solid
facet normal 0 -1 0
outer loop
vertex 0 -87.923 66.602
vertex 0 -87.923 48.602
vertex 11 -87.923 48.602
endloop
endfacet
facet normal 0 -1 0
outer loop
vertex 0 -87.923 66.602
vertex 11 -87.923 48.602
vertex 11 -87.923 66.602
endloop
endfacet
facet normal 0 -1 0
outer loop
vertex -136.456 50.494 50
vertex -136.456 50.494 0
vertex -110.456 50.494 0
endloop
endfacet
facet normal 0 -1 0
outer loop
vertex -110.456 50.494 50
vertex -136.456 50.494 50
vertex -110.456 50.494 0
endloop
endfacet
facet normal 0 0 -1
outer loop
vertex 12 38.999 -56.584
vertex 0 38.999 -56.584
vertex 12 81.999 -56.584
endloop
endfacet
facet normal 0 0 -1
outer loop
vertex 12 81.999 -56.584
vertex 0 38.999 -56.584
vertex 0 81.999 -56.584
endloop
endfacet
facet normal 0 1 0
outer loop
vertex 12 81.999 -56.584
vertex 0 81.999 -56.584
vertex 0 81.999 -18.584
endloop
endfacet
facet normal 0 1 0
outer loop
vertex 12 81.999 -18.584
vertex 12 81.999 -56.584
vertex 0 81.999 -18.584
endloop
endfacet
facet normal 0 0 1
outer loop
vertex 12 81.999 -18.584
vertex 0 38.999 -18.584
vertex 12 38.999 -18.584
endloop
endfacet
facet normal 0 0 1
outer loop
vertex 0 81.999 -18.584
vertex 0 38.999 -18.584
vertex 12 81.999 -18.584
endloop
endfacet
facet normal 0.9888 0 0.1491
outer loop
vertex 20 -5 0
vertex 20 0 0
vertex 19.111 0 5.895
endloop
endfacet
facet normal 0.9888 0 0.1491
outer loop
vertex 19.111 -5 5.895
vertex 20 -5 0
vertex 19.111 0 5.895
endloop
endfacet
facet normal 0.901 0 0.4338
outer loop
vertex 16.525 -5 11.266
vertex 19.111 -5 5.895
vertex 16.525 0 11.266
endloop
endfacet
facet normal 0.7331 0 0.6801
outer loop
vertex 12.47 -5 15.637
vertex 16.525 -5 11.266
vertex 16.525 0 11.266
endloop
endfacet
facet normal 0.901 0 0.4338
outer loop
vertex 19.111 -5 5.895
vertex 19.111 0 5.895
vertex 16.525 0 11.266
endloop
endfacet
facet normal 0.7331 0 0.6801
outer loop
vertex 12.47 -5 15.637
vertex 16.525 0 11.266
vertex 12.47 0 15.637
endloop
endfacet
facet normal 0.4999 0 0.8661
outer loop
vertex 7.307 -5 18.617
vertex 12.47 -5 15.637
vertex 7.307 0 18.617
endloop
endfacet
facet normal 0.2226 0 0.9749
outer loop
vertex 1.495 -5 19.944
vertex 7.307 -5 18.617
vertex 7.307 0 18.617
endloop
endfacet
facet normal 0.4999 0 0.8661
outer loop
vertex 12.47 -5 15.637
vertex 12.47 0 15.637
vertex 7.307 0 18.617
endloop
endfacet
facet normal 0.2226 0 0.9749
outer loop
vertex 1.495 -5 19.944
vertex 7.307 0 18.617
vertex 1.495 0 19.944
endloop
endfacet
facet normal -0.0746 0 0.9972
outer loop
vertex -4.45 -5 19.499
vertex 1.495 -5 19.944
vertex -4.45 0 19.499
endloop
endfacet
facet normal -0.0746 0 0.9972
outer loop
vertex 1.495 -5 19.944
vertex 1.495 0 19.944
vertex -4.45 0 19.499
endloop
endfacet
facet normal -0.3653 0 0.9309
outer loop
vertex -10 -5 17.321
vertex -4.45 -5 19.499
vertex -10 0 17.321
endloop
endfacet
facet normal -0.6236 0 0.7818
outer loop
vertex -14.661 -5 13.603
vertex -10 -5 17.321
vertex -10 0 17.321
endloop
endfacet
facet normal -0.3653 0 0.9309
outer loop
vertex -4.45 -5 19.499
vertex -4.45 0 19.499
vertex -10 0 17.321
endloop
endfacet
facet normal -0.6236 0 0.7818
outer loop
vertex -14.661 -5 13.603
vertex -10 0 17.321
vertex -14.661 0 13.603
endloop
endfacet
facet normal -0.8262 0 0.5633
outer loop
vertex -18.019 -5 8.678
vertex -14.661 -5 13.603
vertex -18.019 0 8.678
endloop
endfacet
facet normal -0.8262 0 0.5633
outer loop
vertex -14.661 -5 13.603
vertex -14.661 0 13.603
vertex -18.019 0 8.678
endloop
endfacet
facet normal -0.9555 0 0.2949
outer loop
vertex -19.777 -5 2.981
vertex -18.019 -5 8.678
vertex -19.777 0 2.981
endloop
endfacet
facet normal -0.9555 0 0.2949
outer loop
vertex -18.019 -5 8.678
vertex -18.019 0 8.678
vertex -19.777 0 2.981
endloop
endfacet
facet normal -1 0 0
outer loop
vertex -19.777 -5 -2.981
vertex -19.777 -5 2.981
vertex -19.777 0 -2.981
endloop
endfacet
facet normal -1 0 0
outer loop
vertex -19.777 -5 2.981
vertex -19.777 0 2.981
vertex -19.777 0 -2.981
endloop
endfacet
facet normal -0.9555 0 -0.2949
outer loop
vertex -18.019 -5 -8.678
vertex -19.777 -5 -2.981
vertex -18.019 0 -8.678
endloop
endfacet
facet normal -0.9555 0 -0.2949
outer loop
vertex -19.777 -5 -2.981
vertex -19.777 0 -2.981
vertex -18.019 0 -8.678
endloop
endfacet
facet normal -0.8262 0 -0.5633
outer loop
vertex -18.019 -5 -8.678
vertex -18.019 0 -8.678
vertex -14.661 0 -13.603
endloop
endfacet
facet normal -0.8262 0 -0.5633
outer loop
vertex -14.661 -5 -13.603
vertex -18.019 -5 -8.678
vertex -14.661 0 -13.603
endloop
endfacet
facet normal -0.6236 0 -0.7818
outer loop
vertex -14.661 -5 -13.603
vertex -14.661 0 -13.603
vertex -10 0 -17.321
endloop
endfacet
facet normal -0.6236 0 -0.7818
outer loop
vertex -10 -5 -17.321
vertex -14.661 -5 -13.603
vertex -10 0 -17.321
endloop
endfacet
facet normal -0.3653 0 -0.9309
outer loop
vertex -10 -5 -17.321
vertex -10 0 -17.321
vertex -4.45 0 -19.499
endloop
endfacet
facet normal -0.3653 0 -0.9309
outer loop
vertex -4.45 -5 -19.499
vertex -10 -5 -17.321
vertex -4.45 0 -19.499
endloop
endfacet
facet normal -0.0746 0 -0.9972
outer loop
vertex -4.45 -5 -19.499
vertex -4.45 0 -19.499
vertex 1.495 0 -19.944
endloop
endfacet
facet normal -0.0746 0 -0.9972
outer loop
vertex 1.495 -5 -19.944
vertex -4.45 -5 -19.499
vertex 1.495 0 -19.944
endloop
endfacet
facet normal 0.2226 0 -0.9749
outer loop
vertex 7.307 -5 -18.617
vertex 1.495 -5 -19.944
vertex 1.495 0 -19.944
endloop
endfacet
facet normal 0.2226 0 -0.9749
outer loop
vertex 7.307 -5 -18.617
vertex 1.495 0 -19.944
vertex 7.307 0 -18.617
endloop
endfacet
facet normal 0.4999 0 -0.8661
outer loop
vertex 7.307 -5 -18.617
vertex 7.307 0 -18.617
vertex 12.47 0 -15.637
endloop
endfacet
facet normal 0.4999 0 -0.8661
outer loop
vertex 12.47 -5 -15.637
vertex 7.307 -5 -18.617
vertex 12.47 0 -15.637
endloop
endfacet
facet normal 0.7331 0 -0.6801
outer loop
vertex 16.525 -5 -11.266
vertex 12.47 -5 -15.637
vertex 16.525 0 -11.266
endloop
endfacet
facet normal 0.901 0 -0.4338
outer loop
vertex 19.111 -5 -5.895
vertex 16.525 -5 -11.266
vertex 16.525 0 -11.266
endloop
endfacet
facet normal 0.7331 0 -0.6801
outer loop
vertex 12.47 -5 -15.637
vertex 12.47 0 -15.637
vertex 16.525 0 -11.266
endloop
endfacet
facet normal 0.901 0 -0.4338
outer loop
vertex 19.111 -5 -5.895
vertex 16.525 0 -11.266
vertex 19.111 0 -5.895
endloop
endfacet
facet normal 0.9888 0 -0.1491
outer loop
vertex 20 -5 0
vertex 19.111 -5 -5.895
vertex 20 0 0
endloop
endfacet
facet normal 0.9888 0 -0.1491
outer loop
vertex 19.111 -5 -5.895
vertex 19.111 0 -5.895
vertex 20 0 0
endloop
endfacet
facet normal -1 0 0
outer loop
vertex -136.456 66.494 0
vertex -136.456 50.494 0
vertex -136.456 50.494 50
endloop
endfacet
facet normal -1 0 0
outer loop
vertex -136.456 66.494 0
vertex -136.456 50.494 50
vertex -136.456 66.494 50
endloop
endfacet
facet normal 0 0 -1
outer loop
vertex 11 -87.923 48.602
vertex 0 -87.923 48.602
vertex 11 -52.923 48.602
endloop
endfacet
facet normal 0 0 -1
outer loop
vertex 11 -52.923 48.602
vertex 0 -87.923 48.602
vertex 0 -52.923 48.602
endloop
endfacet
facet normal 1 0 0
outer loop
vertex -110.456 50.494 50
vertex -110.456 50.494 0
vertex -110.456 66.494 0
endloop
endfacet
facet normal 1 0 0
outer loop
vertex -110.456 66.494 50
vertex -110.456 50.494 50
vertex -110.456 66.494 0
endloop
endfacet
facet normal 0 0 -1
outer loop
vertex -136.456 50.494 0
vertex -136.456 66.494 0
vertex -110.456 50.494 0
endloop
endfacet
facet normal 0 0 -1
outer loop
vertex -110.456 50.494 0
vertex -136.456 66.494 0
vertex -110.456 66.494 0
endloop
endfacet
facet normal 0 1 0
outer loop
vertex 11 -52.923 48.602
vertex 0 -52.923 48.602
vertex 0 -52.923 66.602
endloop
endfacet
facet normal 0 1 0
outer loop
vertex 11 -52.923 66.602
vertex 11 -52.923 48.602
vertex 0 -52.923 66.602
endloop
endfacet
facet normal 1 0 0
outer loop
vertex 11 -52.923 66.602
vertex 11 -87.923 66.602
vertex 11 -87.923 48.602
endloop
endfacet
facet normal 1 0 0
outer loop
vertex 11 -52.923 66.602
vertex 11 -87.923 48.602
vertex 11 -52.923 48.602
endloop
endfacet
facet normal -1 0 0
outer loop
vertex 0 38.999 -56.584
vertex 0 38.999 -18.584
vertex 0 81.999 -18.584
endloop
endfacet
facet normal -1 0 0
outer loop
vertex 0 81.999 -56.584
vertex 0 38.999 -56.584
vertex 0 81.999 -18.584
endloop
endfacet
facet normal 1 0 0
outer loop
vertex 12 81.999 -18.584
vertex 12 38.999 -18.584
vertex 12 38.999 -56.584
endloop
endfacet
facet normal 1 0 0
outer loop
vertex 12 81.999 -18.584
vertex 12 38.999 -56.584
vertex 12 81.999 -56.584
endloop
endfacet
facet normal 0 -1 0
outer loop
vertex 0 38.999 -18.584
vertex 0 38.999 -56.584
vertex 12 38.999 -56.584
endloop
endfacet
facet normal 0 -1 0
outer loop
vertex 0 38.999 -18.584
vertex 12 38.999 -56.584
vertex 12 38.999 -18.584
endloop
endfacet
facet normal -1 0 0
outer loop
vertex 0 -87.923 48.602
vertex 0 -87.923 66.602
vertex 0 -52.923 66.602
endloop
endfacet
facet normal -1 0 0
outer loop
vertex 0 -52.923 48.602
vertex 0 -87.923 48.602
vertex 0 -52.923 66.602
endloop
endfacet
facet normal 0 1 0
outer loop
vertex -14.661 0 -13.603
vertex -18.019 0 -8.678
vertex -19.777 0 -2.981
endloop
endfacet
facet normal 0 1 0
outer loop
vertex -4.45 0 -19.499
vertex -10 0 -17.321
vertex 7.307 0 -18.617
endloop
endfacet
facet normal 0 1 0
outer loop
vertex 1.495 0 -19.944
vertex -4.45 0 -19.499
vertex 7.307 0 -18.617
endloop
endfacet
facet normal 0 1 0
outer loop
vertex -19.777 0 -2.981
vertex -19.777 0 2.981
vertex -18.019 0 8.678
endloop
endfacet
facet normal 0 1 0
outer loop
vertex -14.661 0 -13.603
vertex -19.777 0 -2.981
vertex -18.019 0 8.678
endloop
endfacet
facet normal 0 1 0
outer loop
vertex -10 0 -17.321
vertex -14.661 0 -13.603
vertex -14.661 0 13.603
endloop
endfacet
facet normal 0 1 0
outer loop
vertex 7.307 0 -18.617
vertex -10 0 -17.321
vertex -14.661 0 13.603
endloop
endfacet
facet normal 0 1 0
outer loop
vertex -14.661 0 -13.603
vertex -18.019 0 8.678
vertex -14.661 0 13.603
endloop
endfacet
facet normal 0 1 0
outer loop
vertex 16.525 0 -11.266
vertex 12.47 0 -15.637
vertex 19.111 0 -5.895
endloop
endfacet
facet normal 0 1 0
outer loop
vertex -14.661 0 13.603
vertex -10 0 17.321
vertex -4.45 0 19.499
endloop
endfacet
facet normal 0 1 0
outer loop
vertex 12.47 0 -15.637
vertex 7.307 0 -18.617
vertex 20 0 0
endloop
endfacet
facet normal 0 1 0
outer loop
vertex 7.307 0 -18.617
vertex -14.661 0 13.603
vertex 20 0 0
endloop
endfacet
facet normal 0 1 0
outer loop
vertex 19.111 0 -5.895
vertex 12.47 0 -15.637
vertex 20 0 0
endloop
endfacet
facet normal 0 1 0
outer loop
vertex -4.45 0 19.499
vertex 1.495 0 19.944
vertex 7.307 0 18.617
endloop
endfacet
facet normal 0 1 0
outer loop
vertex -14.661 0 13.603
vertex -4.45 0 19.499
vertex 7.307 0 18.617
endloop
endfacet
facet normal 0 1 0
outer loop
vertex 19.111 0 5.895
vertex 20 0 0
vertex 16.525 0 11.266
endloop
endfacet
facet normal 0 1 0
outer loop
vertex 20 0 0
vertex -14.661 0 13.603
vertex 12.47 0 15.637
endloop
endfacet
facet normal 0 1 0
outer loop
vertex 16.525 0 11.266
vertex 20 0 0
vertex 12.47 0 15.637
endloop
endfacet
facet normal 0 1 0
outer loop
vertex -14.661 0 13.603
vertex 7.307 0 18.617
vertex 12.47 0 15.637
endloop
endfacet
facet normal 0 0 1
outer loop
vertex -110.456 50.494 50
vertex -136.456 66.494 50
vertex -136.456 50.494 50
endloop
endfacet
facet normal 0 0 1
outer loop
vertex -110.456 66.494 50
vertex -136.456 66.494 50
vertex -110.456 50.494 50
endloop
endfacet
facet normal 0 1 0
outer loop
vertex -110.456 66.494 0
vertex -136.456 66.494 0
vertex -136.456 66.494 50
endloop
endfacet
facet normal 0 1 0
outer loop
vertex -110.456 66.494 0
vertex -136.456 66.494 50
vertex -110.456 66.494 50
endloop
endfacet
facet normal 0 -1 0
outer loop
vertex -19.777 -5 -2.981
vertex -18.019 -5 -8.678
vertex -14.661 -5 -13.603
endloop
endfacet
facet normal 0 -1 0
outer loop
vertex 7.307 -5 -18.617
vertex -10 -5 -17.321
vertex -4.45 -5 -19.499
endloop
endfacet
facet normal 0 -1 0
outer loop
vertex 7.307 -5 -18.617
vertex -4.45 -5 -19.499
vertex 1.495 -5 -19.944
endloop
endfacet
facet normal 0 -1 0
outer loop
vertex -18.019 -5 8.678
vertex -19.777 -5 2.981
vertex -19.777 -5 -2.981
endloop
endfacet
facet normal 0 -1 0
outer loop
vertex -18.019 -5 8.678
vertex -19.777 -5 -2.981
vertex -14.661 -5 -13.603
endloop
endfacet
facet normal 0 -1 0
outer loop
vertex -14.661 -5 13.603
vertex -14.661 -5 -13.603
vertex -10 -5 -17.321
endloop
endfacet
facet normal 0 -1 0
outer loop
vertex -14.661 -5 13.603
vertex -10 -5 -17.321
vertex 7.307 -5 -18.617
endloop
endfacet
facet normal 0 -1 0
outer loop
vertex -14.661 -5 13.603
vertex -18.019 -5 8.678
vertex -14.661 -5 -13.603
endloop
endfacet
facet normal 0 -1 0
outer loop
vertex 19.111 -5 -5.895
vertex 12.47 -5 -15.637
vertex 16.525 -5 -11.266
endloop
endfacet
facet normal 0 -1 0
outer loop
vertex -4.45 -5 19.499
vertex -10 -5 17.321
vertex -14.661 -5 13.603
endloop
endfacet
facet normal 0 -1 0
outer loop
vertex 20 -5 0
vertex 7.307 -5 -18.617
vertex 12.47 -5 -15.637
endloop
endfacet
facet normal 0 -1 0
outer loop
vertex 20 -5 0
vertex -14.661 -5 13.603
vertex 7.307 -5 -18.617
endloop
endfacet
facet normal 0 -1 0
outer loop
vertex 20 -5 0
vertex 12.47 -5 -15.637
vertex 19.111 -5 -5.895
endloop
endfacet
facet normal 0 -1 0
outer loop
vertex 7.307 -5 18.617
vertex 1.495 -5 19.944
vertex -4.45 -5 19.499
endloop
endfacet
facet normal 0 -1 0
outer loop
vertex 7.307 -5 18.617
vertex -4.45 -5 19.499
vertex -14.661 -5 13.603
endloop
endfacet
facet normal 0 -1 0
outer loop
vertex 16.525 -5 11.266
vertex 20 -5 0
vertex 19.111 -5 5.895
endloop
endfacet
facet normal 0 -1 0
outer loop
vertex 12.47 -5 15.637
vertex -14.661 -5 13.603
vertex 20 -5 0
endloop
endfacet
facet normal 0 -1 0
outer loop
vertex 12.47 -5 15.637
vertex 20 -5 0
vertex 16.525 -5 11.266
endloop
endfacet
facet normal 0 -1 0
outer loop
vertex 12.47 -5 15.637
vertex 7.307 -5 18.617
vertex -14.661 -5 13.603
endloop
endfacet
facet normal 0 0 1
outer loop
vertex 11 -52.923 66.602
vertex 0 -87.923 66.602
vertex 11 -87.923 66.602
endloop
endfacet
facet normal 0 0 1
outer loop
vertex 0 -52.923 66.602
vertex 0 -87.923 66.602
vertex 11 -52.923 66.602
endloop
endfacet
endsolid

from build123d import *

# Parameters (mm, degrees)
F0_W     = 26
F0_H     = 16
F1_DEPTH = 50
F2_R     = 20
F3_DEPTH = 5
F4_W     = 43
F4_H     = 38
F5_DEPTH = 12
F6_W     = 35
F6_H     = 18
F7_DEPTH = 11


with BuildPart() as f1:
    # F0 (on Top) → F1 (new body)
    with BuildSketch(Plane.XY):
        with Locations((-123.455669, 58.494023)):
            Rectangle(F0_W, F0_H)
    extrude(amount=F1_DEPTH)


with BuildPart() as f3:
    # F2 (on Front) → F3 (new body)
    with BuildSketch(Plane.XZ):
        Circle(F2_R)
    extrude(amount=F3_DEPTH)


with BuildPart() as f5:
    # F4 (on Right) → F5 (new body)
    with BuildSketch(Plane.YZ):
        with Locations((60.49881, -37.584079)):
            Rectangle(F4_W, F4_H)
    extrude(amount=F5_DEPTH)


with BuildPart() as f7:
    # F6 (on Right) → F7 (new body)
    with BuildSketch(Plane.YZ):
        with Locations((-70.422539, 57.60181)):
            Rectangle(F6_W, F6_H)
    extrude(amount=F7_DEPTH)


solid = Compound([f1.part, f3.part, f5.part, f7.part])
